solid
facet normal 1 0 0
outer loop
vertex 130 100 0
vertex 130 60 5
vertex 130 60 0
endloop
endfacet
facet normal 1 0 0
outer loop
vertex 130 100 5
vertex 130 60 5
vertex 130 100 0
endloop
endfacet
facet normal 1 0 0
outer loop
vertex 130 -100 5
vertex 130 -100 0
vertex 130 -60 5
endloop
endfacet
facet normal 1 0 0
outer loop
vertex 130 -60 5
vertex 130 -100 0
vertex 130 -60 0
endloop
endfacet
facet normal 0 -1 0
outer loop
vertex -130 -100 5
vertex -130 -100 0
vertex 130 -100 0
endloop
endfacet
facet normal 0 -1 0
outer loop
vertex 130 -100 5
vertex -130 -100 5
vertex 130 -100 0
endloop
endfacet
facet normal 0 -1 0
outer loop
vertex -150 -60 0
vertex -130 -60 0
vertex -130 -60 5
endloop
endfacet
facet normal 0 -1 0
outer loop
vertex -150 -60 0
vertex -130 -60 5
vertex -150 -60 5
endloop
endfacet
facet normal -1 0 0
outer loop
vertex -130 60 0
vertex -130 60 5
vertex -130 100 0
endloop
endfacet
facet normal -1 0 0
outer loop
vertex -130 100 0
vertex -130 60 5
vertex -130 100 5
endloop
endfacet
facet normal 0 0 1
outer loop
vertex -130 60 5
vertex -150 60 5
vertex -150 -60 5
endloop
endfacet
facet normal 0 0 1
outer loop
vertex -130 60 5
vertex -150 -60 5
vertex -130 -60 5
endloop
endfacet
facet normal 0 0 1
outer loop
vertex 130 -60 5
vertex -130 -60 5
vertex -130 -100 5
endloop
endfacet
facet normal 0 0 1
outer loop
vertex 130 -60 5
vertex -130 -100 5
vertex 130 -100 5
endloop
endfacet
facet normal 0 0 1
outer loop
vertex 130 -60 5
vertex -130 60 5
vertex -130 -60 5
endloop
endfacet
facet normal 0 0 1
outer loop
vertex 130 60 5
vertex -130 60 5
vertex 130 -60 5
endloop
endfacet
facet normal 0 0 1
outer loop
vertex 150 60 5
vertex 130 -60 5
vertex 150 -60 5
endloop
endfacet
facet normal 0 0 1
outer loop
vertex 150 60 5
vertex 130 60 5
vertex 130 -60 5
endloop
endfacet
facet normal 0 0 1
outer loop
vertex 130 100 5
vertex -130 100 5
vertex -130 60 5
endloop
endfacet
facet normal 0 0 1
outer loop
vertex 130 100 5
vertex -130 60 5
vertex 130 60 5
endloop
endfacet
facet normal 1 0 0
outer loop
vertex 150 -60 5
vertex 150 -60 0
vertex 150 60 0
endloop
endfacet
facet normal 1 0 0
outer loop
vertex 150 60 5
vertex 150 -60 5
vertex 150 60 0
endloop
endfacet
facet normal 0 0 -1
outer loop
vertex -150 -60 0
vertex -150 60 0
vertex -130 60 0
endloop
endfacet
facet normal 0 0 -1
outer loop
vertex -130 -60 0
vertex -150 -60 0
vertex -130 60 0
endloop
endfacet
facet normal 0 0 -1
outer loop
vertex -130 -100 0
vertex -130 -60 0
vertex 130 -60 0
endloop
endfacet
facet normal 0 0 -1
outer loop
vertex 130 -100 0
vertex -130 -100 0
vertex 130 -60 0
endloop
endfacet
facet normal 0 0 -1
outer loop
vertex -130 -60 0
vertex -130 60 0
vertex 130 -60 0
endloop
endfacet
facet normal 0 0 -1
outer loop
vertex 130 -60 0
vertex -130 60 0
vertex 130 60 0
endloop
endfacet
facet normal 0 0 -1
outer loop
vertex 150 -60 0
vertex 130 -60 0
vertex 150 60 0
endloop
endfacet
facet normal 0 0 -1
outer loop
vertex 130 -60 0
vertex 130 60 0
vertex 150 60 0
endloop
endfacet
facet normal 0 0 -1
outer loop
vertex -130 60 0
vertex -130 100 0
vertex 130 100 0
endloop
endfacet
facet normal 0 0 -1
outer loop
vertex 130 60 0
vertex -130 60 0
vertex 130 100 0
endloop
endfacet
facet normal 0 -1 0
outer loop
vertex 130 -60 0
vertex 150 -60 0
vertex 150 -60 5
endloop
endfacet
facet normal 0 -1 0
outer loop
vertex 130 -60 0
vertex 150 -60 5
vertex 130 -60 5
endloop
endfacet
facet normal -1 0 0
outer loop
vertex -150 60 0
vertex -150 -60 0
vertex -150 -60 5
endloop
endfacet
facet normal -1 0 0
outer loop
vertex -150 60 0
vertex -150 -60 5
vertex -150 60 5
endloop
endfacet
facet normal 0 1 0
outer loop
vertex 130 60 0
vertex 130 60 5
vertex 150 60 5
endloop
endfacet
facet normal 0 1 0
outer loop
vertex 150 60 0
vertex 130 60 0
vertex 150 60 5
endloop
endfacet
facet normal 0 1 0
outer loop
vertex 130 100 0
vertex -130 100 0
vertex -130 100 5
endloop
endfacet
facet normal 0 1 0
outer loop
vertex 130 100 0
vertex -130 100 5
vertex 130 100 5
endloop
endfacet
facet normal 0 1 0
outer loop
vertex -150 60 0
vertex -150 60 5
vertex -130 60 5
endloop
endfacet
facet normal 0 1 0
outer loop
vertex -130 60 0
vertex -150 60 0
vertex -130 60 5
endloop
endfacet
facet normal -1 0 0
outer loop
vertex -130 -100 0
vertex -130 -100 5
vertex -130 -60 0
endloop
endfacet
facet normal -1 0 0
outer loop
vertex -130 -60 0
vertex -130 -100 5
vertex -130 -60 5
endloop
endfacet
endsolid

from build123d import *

# Parameters (mm, degrees)
SKETCH1_W           = 300
SKETCH1_H           = 200
BOSS_EXTRUDE1_DEPTH = 5
SKETCH3_W           = 20
SKETCH3_H           = 20
SKETCH3_H_2         = 40
CUT_EXTRUDE1_DEPTH  = 5
SKETCH4_W           = 20
SKETCH4_H           = 40
CUT_EXTRUDE2_DEPTH  = 10


with BuildPart() as part:
    # Sketch1 → Boss-Extrude1 (new body)
    with BuildSketch(Plane.XY):
        Rectangle(SKETCH1_W, SKETCH1_H)
    extrude(amount=BOSS_EXTRUDE1_DEPTH)

    # Sketch3 → Cut-Extrude1 (cut)
    with BuildSketch(Plane.XY.offset(5)):
        with Locations((-140, -90)):
            Rectangle(SKETCH3_W, SKETCH3_H)
        with Locations((-140, 80)):
            Rectangle(SKETCH3_W, SKETCH3_H_2)
        with Locations((140, 80)):
            Rectangle(SKETCH3_W, SKETCH3_H_2)
        with Locations((140, -90)):
            Rectangle(SKETCH3_W, SKETCH3_H)
    extrude(amount=-CUT_EXTRUDE1_DEPTH, mode=Mode.SUBTRACT)

    # Sketch4 → Cut-Extrude2 (cut)
    with BuildSketch(Plane(origin=(0, 0, 0), x_dir=(-1, 0, 0), z_dir=(0, 0, -1))):
        with Locations((-140, -80)):
            Rectangle(SKETCH4_W, SKETCH4_H)
        with Locations((140, -80)):
            Rectangle(SKETCH4_W, SKETCH4_H)
    extrude(amount=-CUT_EXTRUDE2_DEPTH, mode=Mode.SUBTRACT)


solid = part.part
